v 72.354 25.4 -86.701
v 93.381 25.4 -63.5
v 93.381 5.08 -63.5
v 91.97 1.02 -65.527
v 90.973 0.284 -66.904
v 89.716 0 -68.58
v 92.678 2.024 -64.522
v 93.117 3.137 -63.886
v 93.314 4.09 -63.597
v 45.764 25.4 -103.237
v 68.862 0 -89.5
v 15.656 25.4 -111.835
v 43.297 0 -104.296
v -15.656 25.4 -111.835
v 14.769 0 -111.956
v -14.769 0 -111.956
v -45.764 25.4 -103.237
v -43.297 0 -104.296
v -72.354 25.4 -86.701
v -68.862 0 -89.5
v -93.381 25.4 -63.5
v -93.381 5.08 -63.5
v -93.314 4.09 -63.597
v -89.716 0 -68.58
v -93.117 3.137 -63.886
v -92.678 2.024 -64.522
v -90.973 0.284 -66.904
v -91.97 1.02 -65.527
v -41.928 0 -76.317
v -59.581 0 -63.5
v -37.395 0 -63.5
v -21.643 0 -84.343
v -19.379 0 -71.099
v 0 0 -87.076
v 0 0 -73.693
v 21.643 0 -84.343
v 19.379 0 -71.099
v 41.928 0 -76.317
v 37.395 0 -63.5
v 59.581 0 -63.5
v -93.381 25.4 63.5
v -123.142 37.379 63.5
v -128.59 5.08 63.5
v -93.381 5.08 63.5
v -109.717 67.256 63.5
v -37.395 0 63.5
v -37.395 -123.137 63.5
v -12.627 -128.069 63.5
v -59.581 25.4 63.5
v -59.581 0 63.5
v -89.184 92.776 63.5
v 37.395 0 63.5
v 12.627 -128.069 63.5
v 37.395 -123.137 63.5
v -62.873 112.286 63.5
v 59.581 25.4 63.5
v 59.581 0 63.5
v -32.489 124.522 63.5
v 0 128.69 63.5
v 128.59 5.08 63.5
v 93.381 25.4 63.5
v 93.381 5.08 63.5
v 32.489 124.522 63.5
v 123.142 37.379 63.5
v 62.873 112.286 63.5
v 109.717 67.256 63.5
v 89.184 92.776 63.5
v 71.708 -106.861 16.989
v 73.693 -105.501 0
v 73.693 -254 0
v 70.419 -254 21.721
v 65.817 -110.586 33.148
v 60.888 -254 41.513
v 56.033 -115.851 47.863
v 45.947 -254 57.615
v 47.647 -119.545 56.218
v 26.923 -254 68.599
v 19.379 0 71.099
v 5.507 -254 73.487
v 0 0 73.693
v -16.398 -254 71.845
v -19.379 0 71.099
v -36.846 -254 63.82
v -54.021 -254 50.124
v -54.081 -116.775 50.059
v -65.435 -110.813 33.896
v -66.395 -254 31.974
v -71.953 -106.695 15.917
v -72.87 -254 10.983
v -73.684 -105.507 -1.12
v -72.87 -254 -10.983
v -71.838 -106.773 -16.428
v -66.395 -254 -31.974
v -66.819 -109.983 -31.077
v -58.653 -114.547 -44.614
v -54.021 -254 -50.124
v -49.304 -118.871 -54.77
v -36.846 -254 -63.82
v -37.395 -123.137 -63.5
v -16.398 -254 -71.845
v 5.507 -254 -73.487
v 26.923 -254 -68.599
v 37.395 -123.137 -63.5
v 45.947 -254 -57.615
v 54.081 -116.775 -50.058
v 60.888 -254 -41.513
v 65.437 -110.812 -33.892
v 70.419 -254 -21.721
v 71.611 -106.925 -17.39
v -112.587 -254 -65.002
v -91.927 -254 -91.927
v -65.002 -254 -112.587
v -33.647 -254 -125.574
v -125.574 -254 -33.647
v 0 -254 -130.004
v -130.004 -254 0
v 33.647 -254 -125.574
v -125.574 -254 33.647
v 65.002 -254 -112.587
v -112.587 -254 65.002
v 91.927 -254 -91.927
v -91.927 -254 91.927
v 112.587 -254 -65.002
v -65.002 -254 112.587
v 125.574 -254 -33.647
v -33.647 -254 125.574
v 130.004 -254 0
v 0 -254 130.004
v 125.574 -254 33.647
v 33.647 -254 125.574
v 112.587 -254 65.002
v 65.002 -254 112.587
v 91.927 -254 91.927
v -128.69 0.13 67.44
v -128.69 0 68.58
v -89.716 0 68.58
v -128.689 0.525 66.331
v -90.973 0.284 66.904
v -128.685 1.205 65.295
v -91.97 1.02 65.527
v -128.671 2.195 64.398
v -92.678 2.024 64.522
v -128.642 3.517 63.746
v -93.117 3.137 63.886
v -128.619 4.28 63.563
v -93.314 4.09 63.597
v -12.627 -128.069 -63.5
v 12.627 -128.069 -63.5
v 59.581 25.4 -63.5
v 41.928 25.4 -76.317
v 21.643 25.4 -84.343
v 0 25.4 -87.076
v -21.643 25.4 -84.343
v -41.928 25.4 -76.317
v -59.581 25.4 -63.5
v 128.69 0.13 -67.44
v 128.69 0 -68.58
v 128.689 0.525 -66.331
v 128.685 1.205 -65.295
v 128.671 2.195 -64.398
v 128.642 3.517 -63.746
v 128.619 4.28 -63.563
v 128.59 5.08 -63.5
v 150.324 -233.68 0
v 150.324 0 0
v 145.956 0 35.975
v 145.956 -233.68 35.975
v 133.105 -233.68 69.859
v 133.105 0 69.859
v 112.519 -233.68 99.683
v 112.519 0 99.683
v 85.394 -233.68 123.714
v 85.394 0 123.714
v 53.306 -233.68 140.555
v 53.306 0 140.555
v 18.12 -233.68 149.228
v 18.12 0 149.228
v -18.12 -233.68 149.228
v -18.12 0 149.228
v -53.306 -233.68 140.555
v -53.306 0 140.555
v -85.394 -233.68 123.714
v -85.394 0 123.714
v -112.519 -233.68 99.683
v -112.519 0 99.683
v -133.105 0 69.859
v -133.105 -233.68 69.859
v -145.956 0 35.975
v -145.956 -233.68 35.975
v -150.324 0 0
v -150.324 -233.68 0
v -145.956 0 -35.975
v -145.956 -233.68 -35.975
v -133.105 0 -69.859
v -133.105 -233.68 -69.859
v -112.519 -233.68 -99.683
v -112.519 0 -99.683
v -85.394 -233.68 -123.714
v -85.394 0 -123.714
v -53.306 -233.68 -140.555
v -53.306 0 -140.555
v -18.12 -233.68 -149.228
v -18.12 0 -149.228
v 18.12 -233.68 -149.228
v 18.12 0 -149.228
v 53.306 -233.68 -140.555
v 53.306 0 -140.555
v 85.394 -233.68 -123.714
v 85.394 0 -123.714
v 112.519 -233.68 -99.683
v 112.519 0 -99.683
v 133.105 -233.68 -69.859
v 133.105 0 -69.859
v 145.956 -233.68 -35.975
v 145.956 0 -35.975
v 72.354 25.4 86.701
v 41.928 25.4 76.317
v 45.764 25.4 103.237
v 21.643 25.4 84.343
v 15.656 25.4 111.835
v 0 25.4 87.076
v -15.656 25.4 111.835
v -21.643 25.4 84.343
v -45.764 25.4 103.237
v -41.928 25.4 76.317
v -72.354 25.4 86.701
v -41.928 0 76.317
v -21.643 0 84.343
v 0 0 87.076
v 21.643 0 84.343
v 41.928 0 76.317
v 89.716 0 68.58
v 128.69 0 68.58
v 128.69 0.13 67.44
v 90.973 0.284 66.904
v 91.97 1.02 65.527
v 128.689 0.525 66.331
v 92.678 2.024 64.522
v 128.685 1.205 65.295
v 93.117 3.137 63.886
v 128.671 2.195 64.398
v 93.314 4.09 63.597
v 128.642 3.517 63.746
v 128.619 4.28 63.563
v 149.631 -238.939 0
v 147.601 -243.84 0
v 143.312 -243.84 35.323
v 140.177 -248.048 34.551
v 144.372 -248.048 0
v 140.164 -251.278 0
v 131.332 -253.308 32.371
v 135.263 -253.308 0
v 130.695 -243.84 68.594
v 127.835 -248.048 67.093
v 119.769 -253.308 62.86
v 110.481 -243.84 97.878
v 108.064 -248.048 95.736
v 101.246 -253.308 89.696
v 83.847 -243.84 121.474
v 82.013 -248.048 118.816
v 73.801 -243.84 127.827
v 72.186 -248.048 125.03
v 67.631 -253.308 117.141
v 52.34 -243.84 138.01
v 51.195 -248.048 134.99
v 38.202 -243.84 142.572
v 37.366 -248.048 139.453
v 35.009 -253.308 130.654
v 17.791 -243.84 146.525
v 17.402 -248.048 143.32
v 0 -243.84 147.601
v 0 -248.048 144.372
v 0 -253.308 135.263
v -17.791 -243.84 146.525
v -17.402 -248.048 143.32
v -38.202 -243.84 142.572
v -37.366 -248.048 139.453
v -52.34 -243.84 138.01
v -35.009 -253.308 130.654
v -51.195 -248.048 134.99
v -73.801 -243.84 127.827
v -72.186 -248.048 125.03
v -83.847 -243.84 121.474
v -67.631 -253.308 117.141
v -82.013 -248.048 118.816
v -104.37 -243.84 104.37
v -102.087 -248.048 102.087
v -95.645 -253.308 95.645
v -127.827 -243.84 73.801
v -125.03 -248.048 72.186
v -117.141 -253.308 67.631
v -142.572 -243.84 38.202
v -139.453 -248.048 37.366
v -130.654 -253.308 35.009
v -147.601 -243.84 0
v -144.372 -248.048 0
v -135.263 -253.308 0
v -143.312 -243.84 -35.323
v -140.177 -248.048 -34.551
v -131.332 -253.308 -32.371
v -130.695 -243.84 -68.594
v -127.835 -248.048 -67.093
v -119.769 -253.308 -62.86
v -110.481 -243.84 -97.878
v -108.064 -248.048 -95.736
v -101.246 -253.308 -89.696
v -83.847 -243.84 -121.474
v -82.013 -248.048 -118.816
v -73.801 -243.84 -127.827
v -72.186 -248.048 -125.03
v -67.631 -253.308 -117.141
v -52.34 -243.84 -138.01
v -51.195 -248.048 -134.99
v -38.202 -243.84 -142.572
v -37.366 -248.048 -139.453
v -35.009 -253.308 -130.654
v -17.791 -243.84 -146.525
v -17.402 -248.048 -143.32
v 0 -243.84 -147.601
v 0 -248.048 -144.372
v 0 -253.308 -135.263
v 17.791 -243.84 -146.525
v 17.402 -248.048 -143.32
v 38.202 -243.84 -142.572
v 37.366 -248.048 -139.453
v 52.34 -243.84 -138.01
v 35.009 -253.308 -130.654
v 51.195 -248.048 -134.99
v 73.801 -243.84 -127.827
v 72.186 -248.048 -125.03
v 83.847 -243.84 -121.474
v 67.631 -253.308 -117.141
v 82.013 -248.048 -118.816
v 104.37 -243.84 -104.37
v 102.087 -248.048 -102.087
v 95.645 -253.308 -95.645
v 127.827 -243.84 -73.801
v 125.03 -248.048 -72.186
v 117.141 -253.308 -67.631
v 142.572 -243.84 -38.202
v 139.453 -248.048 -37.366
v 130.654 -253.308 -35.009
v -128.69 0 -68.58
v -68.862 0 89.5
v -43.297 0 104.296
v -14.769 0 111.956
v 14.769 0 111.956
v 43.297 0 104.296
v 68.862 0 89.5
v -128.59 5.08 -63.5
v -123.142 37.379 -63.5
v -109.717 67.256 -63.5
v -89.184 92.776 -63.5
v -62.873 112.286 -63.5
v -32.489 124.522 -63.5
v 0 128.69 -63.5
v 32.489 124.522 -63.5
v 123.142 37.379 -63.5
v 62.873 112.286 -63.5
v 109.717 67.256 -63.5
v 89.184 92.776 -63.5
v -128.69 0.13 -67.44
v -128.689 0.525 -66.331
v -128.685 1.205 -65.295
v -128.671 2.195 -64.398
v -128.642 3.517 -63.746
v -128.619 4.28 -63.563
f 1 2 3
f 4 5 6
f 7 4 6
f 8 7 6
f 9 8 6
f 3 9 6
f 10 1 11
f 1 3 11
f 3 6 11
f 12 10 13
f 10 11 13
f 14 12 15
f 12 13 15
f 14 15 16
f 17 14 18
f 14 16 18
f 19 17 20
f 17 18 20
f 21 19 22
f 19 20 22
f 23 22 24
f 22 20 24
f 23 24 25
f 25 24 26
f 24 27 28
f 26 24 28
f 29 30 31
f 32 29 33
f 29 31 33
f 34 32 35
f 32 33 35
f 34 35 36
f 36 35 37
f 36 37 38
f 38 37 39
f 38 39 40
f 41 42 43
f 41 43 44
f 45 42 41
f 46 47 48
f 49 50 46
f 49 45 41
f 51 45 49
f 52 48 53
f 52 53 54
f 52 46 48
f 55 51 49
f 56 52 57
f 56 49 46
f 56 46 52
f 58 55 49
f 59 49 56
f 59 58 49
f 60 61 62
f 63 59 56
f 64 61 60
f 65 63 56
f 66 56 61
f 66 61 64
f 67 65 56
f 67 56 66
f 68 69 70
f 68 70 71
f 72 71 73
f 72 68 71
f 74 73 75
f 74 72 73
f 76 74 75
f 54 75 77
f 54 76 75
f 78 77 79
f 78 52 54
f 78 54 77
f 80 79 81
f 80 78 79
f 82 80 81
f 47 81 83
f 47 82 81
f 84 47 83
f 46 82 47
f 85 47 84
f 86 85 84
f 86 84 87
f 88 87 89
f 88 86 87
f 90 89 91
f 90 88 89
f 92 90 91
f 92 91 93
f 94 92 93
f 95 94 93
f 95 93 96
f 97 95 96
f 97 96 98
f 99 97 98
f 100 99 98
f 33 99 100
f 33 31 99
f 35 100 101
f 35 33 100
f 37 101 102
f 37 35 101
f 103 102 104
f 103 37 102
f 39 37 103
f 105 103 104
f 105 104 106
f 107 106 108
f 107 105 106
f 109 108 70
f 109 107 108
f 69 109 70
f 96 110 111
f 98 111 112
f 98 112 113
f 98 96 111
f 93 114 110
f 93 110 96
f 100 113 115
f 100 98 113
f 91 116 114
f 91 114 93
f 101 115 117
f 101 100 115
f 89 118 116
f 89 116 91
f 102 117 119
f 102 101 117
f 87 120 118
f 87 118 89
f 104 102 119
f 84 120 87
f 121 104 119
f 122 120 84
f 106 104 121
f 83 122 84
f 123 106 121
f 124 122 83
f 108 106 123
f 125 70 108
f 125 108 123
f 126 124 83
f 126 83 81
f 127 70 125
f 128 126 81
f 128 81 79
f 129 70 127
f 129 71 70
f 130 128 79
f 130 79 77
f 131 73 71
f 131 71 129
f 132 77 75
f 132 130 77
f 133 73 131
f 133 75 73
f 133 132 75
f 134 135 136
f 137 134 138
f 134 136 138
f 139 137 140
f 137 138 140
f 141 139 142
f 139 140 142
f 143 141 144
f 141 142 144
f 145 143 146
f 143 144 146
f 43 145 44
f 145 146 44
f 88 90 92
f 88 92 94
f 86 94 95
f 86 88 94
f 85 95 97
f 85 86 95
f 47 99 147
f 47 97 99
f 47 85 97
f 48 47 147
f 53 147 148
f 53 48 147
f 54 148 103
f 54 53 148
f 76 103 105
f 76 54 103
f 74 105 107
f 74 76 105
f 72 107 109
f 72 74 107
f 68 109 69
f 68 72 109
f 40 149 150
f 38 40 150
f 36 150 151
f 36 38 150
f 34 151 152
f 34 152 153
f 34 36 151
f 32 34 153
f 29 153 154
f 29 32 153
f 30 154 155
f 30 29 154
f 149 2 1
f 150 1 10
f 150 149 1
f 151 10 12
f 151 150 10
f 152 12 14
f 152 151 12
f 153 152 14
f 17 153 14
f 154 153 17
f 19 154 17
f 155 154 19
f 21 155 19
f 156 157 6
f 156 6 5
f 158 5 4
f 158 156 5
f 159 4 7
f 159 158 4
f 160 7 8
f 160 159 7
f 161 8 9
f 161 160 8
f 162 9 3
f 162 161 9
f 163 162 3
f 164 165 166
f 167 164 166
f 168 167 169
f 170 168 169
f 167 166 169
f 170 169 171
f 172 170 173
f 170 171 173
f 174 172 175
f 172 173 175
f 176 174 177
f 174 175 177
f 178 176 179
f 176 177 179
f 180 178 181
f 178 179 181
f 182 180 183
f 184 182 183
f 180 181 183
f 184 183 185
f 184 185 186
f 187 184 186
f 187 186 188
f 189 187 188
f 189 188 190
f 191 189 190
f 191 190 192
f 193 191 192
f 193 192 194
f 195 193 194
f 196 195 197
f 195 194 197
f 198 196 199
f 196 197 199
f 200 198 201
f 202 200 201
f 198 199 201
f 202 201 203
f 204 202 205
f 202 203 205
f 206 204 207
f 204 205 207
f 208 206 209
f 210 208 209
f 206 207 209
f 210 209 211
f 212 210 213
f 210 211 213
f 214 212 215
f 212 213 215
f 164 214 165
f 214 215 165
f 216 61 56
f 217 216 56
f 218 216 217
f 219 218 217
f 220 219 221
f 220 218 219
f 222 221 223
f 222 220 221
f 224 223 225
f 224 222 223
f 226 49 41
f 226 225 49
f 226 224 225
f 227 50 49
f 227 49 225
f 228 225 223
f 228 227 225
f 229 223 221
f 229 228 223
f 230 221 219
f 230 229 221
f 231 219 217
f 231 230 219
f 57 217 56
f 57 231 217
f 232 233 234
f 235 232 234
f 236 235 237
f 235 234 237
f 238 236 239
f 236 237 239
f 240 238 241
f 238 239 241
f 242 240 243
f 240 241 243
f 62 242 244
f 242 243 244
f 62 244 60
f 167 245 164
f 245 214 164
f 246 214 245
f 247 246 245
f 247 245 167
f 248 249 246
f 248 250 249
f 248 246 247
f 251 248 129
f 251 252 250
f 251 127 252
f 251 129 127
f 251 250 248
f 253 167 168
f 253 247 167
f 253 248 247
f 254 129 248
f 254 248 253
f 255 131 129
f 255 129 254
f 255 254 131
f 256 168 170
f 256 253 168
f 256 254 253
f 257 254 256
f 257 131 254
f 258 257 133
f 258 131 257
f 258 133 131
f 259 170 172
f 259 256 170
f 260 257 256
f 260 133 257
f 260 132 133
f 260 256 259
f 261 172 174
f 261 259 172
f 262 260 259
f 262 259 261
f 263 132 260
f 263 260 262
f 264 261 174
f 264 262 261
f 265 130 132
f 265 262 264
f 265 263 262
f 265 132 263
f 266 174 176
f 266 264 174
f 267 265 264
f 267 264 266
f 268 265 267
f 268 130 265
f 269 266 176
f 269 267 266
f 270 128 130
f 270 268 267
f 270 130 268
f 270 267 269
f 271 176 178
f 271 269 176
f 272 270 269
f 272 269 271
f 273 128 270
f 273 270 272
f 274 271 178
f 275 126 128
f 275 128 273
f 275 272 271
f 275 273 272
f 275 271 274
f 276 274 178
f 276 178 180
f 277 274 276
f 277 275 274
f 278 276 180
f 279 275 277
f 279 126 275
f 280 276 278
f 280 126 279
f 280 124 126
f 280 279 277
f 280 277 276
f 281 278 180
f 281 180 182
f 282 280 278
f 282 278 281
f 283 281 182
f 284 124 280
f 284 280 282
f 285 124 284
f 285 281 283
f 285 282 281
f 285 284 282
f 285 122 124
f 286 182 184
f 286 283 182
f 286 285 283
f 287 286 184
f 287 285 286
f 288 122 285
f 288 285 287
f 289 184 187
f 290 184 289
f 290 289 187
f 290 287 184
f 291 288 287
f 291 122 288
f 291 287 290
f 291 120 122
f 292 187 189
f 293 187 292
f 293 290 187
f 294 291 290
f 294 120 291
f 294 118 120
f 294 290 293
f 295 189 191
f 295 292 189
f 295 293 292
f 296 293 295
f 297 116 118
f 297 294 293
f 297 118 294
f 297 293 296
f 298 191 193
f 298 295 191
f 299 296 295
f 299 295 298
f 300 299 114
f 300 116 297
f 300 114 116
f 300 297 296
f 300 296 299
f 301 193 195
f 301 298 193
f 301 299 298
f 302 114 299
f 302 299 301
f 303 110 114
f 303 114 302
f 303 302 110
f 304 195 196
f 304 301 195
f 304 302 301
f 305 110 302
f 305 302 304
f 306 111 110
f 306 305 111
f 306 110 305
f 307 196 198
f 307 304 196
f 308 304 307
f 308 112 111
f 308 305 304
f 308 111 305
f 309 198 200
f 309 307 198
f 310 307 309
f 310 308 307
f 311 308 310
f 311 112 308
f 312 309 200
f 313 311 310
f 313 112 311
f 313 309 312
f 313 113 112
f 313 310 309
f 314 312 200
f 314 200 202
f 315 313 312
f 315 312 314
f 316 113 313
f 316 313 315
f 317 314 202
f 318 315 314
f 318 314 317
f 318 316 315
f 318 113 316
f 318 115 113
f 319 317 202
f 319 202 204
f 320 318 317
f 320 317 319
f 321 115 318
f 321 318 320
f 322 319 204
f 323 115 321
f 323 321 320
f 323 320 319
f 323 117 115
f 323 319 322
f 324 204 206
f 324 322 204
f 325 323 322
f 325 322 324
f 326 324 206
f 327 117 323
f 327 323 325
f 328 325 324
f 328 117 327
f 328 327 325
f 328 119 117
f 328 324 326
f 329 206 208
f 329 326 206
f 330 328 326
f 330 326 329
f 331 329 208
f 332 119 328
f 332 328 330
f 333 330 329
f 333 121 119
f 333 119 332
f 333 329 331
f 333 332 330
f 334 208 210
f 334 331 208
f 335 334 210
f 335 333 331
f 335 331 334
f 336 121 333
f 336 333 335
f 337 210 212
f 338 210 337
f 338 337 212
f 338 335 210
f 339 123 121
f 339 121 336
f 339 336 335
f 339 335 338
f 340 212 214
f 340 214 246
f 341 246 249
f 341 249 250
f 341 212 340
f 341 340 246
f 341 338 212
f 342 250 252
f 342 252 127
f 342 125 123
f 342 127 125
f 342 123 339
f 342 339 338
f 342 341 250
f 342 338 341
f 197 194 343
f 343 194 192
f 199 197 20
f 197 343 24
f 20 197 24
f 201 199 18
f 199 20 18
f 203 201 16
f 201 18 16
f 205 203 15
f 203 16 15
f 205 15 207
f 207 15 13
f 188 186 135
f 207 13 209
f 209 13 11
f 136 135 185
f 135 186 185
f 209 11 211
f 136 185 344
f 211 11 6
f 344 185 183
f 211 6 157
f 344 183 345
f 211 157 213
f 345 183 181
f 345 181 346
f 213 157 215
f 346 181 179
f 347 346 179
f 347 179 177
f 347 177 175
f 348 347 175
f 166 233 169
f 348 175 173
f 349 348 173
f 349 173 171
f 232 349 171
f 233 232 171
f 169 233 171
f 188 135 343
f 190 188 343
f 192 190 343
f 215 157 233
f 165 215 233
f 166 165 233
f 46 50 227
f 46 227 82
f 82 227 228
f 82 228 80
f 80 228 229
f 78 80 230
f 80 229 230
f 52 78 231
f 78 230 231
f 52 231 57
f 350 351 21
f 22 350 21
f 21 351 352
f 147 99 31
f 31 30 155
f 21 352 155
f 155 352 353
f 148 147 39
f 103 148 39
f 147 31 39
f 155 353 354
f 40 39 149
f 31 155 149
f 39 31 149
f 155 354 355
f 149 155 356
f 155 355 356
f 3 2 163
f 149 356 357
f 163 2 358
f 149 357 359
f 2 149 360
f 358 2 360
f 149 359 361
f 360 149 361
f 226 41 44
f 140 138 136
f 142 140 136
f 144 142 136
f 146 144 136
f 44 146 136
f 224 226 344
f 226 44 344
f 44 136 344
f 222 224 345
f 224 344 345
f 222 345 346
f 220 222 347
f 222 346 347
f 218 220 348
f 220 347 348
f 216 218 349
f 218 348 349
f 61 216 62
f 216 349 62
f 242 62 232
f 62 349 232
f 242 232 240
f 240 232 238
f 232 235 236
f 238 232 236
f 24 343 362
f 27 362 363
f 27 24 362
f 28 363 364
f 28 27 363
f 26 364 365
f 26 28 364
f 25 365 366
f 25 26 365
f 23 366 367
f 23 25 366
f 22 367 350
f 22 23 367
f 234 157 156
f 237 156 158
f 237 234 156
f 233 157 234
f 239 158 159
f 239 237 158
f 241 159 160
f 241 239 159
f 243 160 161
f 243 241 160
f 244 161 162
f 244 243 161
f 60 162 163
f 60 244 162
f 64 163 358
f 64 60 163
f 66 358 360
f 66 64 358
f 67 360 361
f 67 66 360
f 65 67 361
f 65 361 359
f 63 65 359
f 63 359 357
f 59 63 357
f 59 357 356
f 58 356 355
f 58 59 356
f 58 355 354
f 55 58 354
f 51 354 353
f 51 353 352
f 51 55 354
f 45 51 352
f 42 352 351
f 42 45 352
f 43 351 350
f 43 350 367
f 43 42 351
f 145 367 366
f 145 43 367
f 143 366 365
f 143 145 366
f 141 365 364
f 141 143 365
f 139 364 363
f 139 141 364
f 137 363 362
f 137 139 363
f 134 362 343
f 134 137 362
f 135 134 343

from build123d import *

# Parameters (mm, degrees)
F0_R         = 150.3237387913
F0_R_2       = 73.6926609148
F1_DEPTH     = 254
F2_R         = 20.32
F3_R         = 112.9256404591
F3_R_2       = 87.0757104376
F4_DEPTH     = 25.4
F5_R         = 128.6901964601
F6_DEPTH     = 63.5
F7_T4_DEPTH  = 60.7095224794
F7_S5_R      = 128.6901964601
F7_T6_DEPTH  = 32
F7_T10_DEPTH = 60.7095224794
F7_S11_R     = 128.6901964601
F7_T12_DEPTH = 32
F7_T16_DEPTH = 60.7095224794
F7_S17_R     = 128.6901964601
F7_T18_DEPTH = 32
F7_T22_DEPTH = 60.7095224794
F7_S23_R     = 128.6901964601
F7_T24_DEPTH = 32


# Not quite as in the source:
# - a fillet or chamfer that OpenCascade refuses, or shapes differently, is made with other operations: its cross-section is extruded or revolved along the edge and cut away or added


with BuildPart() as f1:
    # F0 (on Front) → F1 (new body)
    with BuildSketch(Plane.XZ):
        Circle(F0_R)
        Circle(F0_R_2, mode=Mode.SUBTRACT)
    extrude(amount=F1_DEPTH)

    # F2
    f2_edges = [f1.edges().sort_by_distance(p)[0] for p in [
        (-150.323739, -254, 0),
    ]]
    fillet(f2_edges, radius=F2_R)

    # F3 (on face) → F4 (join)
    with BuildSketch(Plane(origin=(0, 0, 0), x_dir=(-1, 0, 0), z_dir=(0, 1, 0))):
        Circle(F3_R)
        Circle(F3_R_2, mode=Mode.SUBTRACT)
    extrude(amount=F4_DEPTH)

    # F5 (on Top) → F6 (join, symmetric)
    with BuildSketch(Plane.XY):
        Circle(F5_R)
    extrude(amount=F6_DEPTH, both=True)

    # F7: fillet of radius 5.08 on 4 edges, made by hand


with BuildPart() as f7_tool2:
    # F7_s3 → F7_t4 (new body)
    with BuildSketch(Plane.YZ.offset(-80.6806739807)):
        with BuildLine():
            ThreePointArc((0, -68.58), (1.4878975516, -64.9878975516), (5.08, -63.5))
            Line((5.08, -63.5), (0, -63.5))
            Line((0, -63.5), (0, -68.58))
        make_face()
    extrude(amount=-F7_T4_DEPTH)

    # F7_s5 → F7_t6 (intersect, symmetric)
    with BuildSketch(Plane.XY.offset(-66)):
        Circle(F7_S5_R)
    extrude(amount=F7_T6_DEPTH, both=True, mode=Mode.INTERSECT)


with BuildPart() as f1_1:
    add(f1.part)

    # F7_t1: union F7_tool2
    add(f7_tool2.part)


with BuildPart() as f7_tool8:
    # F7_s9 → F7_t10 (new body)
    with BuildSketch(Plane.YZ.offset(141.3901964601)):
        with BuildLine():
            ThreePointArc((0, -68.58), (1.4878975516, -64.9878975516), (5.08, -63.5))
            Line((5.08, -63.5), (0, -63.5))
            Line((0, -63.5), (0, -68.58))
        make_face()
    extrude(amount=-F7_T10_DEPTH)

    # F7_s11 → F7_t12 (intersect, symmetric)
    with BuildSketch(Plane.XY.offset(-66)):
        Circle(F7_S11_R)
    extrude(amount=F7_T12_DEPTH, both=True, mode=Mode.INTERSECT)


with BuildPart() as f1_2:
    add(f1_1.part)

    # F7_t7: union F7_tool8
    add(f7_tool8.part)


with BuildPart() as f7_tool14:
    # F7_s15 → F7_t16 (new body)
    with BuildSketch(Plane.YZ.offset(-80.6806739807)):
        with BuildLine():
            ThreePointArc((0, 68.58), (1.4878975516, 64.9878975516), (5.08, 63.5))
            Line((5.08, 63.5), (0, 63.5))
            Line((0, 63.5), (0, 68.58))
        make_face()
    extrude(amount=-F7_T16_DEPTH)

    # F7_s17 → F7_t18 (intersect, symmetric)
    with BuildSketch(Plane.XY.offset(66)):
        Circle(F7_S17_R)
    extrude(amount=F7_T18_DEPTH, both=True, mode=Mode.INTERSECT)


with BuildPart() as f1_3:
    add(f1_2.part)

    # F7_t13: union F7_tool14
    add(f7_tool14.part)


with BuildPart() as f7_tool20:
    # F7_s21 → F7_t22 (new body)
    with BuildSketch(Plane.YZ.offset(141.3901964601)):
        with BuildLine():
            ThreePointArc((0, 68.58), (1.4878975516, 64.9878975516), (5.08, 63.5))
            Line((5.08, 63.5), (0, 63.5))
            Line((0, 63.5), (0, 68.58))
        make_face()
    extrude(amount=-F7_T22_DEPTH)

    # F7_s23 → F7_t24 (intersect, symmetric)
    with BuildSketch(Plane.XY.offset(66)):
        Circle(F7_S23_R)
    extrude(amount=F7_T24_DEPTH, both=True, mode=Mode.INTERSECT)


with BuildPart() as f1_4:
    add(f1_3.part)

    # F7_t19: union F7_tool20
    add(f7_tool20.part)


solid = f1_4.part
